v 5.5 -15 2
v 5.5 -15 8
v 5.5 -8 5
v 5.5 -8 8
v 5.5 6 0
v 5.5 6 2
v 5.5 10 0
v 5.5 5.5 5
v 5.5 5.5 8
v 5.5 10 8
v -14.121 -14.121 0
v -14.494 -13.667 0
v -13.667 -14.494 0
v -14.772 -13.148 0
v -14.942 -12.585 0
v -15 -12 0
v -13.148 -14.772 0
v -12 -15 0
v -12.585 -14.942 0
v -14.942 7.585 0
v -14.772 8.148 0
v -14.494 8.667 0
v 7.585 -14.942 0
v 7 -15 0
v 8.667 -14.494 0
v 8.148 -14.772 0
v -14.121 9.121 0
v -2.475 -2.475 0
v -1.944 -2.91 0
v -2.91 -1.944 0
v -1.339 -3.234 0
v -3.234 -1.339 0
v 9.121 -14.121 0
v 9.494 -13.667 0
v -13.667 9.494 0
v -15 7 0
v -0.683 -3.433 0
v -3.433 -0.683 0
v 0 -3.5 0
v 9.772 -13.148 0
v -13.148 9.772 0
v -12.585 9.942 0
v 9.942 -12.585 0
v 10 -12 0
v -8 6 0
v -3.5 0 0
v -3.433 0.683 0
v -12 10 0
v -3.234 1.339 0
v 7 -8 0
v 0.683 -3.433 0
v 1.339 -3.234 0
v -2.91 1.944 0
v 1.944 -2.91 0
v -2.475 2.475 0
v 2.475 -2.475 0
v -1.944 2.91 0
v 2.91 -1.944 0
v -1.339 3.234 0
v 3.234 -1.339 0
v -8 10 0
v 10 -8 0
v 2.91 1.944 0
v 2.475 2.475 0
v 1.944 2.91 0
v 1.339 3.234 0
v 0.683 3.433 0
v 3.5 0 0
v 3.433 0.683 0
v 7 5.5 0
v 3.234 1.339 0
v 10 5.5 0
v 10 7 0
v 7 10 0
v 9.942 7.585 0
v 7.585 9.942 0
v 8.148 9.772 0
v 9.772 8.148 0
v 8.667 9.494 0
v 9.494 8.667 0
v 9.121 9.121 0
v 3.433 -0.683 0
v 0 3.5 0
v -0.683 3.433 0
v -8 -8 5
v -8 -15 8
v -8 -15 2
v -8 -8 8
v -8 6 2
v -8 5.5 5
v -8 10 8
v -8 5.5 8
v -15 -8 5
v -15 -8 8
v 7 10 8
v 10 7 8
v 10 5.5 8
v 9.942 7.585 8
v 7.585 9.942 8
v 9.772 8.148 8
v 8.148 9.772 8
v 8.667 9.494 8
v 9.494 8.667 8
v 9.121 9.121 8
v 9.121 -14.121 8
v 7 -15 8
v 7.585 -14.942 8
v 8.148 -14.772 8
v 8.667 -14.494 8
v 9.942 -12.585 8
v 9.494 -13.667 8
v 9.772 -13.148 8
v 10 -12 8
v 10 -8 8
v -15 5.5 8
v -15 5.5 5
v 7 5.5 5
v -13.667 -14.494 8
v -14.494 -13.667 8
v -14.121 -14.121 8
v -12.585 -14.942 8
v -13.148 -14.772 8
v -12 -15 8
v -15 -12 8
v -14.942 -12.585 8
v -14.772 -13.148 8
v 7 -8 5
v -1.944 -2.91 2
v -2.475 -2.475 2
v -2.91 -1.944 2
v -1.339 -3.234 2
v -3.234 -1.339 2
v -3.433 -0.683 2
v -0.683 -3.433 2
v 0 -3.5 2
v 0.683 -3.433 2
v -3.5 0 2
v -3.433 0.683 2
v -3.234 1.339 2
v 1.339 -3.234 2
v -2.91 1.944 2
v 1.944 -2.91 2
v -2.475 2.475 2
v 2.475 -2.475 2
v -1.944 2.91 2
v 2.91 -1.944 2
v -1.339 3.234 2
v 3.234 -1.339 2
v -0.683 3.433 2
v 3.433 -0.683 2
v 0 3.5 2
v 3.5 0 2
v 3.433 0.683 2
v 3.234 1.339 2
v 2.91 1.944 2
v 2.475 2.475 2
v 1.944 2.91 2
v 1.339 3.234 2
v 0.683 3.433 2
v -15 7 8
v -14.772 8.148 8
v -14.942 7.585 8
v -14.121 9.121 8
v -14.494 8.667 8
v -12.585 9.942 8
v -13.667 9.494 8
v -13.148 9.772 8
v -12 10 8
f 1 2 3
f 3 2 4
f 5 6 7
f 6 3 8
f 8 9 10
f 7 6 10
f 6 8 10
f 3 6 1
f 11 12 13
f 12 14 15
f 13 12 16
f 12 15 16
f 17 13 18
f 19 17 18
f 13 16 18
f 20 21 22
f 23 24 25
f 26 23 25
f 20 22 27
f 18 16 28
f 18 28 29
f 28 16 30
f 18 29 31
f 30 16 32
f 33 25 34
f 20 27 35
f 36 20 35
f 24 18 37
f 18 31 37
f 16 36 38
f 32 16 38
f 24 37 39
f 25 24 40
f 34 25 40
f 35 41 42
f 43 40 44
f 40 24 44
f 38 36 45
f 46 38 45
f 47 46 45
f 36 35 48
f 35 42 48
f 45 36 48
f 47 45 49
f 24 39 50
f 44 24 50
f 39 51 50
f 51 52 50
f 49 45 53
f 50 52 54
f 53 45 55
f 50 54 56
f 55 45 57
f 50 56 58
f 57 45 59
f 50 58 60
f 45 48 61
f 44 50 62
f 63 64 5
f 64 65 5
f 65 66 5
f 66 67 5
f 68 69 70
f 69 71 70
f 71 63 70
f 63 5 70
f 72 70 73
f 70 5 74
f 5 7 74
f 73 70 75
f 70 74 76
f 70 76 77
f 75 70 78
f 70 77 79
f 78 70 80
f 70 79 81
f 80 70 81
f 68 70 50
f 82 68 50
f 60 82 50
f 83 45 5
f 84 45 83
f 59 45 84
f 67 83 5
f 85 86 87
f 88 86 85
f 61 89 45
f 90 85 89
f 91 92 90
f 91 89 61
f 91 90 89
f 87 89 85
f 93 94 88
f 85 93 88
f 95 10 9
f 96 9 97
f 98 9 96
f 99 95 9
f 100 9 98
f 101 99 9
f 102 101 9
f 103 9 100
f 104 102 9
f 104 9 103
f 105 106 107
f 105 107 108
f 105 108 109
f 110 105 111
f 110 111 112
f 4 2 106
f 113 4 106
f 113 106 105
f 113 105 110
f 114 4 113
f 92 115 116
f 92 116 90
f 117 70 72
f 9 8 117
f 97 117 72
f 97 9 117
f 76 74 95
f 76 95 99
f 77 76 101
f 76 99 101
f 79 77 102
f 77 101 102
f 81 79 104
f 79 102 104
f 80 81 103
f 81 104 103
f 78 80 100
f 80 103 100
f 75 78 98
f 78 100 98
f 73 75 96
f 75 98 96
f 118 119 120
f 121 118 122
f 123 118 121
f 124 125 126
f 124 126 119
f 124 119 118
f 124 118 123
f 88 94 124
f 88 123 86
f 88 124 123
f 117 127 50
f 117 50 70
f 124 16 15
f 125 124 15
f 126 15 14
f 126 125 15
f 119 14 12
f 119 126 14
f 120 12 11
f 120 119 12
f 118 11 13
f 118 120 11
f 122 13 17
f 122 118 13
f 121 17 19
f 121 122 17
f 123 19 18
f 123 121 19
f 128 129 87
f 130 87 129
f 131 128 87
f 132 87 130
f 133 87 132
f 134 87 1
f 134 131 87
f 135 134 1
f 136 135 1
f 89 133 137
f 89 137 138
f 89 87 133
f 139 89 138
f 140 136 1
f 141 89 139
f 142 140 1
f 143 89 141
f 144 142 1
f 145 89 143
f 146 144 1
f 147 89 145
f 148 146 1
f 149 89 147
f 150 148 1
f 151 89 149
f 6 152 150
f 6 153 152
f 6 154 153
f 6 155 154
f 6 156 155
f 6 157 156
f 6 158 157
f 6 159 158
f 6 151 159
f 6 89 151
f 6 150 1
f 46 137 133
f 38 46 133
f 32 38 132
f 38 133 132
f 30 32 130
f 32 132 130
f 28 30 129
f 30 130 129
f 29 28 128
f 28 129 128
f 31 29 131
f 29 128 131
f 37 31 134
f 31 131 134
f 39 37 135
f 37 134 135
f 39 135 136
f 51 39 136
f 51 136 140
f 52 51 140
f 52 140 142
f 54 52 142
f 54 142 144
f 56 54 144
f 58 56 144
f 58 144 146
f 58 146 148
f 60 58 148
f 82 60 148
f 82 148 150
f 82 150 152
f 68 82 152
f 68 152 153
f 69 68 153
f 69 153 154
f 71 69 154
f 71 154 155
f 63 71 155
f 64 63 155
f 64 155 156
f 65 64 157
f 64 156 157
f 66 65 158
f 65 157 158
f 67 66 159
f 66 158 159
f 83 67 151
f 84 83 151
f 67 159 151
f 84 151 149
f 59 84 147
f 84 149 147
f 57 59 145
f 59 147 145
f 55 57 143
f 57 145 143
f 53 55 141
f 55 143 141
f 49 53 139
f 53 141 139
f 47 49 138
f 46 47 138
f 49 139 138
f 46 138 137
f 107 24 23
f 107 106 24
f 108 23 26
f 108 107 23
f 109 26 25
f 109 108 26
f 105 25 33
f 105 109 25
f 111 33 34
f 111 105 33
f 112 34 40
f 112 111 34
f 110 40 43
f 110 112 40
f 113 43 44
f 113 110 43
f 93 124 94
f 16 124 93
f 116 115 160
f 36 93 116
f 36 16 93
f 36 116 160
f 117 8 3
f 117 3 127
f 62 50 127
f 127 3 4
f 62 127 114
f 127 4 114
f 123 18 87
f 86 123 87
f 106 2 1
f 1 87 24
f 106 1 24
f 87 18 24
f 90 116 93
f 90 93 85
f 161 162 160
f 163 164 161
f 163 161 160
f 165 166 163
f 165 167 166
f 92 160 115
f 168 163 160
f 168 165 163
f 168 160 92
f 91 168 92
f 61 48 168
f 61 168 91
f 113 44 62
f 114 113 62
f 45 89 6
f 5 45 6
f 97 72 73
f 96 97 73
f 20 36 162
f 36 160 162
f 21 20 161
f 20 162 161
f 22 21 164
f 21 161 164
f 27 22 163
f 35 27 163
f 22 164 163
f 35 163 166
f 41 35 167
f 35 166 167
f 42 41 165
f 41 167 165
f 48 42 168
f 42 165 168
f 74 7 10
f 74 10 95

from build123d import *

# Parameters (mm, degrees)
F0_W      = 25
F0_H      = 25
F1_DEPTH  = 8
F2_W      = 13.5
F2_H      = 25
F3_DEPTH  = 6
F4_R      = 3
F5_DEPTH  = 6
F6_W      = 7
F6_H      = 13.5
F7_DEPTH  = 3
F8_W      = 4.5
F8_H      = 13.5
F9_DEPTH  = 3
F10_W     = 3
F10_H     = 13.5
F11_DEPTH = 6
F12_W     = 13.5
F12_H     = 4
F13_DEPTH = 3
F15_D     = 7


with BuildPart() as f1:
    # F0 (on Top) → F1 (new body)
    with BuildSketch(Plane.XY):
        with Locations((-2.5, -2.5)):
            Rectangle(F0_W, F0_H)
    extrude(amount=F1_DEPTH)

    # F2 (on face) → F3 (cut)
    with BuildSketch(Plane.XY.offset(8)):
        with Locations((-1.25, -2.5)):
            Rectangle(F2_W, F2_H)
    extrude(amount=-F3_DEPTH, mode=Mode.SUBTRACT)

    # F4
    f4_edges = [f1.edges().sort_by_distance(p)[0] for p in [
        (10, -15, 4),
        (10, 10, 4),
        (-15, 10, 4),
        (-15, -15, 4),
    ]]
    fillet(f4_edges, radius=F4_R)

    # F2 (on face) → F5 (cut)
    with BuildSketch(Plane.XY.offset(8)):
        with Locations((-1.25, -2.5)):
            Rectangle(F2_W, F2_H)
    extrude(amount=-F5_DEPTH, mode=Mode.SUBTRACT)

    # F6 (on face) → F7 (cut)
    with BuildSketch(Plane.XY.offset(8)):
        with Locations((-11.5, -1.25)):
            Rectangle(F6_W, F6_H)
    extrude(amount=-F7_DEPTH, mode=Mode.SUBTRACT)

    # F8 (on face) → F9 (cut)
    with BuildSketch(Plane.XY.offset(8)):
        with Locations((7.75, -1.25)):
            Rectangle(F8_W, F8_H)
    extrude(amount=-F9_DEPTH, mode=Mode.SUBTRACT)

    # F10 (on face) → F11 (cut)
    with BuildSketch(Plane.XY.offset(5)):
        with Locations((8.5, -1.25)):
            Rectangle(F10_W, F10_H)
    extrude(amount=-F11_DEPTH, mode=Mode.SUBTRACT)

    # F12 (on face) → F13 (cut)
    with BuildSketch(Plane.XY.offset(2)):
        with Locations((-1.25, 8)):
            Rectangle(F12_W, F12_H)
    extrude(amount=-F13_DEPTH, mode=Mode.SUBTRACT)

    # F15 (through all)
    with Locations(Plane(origin=(0, 0, 0), x_dir=(1, 0, 0), z_dir=(0, 0, -1))):
        with Locations((0, 0)):
            Hole(F15_D / 2)


solid = f1.part
